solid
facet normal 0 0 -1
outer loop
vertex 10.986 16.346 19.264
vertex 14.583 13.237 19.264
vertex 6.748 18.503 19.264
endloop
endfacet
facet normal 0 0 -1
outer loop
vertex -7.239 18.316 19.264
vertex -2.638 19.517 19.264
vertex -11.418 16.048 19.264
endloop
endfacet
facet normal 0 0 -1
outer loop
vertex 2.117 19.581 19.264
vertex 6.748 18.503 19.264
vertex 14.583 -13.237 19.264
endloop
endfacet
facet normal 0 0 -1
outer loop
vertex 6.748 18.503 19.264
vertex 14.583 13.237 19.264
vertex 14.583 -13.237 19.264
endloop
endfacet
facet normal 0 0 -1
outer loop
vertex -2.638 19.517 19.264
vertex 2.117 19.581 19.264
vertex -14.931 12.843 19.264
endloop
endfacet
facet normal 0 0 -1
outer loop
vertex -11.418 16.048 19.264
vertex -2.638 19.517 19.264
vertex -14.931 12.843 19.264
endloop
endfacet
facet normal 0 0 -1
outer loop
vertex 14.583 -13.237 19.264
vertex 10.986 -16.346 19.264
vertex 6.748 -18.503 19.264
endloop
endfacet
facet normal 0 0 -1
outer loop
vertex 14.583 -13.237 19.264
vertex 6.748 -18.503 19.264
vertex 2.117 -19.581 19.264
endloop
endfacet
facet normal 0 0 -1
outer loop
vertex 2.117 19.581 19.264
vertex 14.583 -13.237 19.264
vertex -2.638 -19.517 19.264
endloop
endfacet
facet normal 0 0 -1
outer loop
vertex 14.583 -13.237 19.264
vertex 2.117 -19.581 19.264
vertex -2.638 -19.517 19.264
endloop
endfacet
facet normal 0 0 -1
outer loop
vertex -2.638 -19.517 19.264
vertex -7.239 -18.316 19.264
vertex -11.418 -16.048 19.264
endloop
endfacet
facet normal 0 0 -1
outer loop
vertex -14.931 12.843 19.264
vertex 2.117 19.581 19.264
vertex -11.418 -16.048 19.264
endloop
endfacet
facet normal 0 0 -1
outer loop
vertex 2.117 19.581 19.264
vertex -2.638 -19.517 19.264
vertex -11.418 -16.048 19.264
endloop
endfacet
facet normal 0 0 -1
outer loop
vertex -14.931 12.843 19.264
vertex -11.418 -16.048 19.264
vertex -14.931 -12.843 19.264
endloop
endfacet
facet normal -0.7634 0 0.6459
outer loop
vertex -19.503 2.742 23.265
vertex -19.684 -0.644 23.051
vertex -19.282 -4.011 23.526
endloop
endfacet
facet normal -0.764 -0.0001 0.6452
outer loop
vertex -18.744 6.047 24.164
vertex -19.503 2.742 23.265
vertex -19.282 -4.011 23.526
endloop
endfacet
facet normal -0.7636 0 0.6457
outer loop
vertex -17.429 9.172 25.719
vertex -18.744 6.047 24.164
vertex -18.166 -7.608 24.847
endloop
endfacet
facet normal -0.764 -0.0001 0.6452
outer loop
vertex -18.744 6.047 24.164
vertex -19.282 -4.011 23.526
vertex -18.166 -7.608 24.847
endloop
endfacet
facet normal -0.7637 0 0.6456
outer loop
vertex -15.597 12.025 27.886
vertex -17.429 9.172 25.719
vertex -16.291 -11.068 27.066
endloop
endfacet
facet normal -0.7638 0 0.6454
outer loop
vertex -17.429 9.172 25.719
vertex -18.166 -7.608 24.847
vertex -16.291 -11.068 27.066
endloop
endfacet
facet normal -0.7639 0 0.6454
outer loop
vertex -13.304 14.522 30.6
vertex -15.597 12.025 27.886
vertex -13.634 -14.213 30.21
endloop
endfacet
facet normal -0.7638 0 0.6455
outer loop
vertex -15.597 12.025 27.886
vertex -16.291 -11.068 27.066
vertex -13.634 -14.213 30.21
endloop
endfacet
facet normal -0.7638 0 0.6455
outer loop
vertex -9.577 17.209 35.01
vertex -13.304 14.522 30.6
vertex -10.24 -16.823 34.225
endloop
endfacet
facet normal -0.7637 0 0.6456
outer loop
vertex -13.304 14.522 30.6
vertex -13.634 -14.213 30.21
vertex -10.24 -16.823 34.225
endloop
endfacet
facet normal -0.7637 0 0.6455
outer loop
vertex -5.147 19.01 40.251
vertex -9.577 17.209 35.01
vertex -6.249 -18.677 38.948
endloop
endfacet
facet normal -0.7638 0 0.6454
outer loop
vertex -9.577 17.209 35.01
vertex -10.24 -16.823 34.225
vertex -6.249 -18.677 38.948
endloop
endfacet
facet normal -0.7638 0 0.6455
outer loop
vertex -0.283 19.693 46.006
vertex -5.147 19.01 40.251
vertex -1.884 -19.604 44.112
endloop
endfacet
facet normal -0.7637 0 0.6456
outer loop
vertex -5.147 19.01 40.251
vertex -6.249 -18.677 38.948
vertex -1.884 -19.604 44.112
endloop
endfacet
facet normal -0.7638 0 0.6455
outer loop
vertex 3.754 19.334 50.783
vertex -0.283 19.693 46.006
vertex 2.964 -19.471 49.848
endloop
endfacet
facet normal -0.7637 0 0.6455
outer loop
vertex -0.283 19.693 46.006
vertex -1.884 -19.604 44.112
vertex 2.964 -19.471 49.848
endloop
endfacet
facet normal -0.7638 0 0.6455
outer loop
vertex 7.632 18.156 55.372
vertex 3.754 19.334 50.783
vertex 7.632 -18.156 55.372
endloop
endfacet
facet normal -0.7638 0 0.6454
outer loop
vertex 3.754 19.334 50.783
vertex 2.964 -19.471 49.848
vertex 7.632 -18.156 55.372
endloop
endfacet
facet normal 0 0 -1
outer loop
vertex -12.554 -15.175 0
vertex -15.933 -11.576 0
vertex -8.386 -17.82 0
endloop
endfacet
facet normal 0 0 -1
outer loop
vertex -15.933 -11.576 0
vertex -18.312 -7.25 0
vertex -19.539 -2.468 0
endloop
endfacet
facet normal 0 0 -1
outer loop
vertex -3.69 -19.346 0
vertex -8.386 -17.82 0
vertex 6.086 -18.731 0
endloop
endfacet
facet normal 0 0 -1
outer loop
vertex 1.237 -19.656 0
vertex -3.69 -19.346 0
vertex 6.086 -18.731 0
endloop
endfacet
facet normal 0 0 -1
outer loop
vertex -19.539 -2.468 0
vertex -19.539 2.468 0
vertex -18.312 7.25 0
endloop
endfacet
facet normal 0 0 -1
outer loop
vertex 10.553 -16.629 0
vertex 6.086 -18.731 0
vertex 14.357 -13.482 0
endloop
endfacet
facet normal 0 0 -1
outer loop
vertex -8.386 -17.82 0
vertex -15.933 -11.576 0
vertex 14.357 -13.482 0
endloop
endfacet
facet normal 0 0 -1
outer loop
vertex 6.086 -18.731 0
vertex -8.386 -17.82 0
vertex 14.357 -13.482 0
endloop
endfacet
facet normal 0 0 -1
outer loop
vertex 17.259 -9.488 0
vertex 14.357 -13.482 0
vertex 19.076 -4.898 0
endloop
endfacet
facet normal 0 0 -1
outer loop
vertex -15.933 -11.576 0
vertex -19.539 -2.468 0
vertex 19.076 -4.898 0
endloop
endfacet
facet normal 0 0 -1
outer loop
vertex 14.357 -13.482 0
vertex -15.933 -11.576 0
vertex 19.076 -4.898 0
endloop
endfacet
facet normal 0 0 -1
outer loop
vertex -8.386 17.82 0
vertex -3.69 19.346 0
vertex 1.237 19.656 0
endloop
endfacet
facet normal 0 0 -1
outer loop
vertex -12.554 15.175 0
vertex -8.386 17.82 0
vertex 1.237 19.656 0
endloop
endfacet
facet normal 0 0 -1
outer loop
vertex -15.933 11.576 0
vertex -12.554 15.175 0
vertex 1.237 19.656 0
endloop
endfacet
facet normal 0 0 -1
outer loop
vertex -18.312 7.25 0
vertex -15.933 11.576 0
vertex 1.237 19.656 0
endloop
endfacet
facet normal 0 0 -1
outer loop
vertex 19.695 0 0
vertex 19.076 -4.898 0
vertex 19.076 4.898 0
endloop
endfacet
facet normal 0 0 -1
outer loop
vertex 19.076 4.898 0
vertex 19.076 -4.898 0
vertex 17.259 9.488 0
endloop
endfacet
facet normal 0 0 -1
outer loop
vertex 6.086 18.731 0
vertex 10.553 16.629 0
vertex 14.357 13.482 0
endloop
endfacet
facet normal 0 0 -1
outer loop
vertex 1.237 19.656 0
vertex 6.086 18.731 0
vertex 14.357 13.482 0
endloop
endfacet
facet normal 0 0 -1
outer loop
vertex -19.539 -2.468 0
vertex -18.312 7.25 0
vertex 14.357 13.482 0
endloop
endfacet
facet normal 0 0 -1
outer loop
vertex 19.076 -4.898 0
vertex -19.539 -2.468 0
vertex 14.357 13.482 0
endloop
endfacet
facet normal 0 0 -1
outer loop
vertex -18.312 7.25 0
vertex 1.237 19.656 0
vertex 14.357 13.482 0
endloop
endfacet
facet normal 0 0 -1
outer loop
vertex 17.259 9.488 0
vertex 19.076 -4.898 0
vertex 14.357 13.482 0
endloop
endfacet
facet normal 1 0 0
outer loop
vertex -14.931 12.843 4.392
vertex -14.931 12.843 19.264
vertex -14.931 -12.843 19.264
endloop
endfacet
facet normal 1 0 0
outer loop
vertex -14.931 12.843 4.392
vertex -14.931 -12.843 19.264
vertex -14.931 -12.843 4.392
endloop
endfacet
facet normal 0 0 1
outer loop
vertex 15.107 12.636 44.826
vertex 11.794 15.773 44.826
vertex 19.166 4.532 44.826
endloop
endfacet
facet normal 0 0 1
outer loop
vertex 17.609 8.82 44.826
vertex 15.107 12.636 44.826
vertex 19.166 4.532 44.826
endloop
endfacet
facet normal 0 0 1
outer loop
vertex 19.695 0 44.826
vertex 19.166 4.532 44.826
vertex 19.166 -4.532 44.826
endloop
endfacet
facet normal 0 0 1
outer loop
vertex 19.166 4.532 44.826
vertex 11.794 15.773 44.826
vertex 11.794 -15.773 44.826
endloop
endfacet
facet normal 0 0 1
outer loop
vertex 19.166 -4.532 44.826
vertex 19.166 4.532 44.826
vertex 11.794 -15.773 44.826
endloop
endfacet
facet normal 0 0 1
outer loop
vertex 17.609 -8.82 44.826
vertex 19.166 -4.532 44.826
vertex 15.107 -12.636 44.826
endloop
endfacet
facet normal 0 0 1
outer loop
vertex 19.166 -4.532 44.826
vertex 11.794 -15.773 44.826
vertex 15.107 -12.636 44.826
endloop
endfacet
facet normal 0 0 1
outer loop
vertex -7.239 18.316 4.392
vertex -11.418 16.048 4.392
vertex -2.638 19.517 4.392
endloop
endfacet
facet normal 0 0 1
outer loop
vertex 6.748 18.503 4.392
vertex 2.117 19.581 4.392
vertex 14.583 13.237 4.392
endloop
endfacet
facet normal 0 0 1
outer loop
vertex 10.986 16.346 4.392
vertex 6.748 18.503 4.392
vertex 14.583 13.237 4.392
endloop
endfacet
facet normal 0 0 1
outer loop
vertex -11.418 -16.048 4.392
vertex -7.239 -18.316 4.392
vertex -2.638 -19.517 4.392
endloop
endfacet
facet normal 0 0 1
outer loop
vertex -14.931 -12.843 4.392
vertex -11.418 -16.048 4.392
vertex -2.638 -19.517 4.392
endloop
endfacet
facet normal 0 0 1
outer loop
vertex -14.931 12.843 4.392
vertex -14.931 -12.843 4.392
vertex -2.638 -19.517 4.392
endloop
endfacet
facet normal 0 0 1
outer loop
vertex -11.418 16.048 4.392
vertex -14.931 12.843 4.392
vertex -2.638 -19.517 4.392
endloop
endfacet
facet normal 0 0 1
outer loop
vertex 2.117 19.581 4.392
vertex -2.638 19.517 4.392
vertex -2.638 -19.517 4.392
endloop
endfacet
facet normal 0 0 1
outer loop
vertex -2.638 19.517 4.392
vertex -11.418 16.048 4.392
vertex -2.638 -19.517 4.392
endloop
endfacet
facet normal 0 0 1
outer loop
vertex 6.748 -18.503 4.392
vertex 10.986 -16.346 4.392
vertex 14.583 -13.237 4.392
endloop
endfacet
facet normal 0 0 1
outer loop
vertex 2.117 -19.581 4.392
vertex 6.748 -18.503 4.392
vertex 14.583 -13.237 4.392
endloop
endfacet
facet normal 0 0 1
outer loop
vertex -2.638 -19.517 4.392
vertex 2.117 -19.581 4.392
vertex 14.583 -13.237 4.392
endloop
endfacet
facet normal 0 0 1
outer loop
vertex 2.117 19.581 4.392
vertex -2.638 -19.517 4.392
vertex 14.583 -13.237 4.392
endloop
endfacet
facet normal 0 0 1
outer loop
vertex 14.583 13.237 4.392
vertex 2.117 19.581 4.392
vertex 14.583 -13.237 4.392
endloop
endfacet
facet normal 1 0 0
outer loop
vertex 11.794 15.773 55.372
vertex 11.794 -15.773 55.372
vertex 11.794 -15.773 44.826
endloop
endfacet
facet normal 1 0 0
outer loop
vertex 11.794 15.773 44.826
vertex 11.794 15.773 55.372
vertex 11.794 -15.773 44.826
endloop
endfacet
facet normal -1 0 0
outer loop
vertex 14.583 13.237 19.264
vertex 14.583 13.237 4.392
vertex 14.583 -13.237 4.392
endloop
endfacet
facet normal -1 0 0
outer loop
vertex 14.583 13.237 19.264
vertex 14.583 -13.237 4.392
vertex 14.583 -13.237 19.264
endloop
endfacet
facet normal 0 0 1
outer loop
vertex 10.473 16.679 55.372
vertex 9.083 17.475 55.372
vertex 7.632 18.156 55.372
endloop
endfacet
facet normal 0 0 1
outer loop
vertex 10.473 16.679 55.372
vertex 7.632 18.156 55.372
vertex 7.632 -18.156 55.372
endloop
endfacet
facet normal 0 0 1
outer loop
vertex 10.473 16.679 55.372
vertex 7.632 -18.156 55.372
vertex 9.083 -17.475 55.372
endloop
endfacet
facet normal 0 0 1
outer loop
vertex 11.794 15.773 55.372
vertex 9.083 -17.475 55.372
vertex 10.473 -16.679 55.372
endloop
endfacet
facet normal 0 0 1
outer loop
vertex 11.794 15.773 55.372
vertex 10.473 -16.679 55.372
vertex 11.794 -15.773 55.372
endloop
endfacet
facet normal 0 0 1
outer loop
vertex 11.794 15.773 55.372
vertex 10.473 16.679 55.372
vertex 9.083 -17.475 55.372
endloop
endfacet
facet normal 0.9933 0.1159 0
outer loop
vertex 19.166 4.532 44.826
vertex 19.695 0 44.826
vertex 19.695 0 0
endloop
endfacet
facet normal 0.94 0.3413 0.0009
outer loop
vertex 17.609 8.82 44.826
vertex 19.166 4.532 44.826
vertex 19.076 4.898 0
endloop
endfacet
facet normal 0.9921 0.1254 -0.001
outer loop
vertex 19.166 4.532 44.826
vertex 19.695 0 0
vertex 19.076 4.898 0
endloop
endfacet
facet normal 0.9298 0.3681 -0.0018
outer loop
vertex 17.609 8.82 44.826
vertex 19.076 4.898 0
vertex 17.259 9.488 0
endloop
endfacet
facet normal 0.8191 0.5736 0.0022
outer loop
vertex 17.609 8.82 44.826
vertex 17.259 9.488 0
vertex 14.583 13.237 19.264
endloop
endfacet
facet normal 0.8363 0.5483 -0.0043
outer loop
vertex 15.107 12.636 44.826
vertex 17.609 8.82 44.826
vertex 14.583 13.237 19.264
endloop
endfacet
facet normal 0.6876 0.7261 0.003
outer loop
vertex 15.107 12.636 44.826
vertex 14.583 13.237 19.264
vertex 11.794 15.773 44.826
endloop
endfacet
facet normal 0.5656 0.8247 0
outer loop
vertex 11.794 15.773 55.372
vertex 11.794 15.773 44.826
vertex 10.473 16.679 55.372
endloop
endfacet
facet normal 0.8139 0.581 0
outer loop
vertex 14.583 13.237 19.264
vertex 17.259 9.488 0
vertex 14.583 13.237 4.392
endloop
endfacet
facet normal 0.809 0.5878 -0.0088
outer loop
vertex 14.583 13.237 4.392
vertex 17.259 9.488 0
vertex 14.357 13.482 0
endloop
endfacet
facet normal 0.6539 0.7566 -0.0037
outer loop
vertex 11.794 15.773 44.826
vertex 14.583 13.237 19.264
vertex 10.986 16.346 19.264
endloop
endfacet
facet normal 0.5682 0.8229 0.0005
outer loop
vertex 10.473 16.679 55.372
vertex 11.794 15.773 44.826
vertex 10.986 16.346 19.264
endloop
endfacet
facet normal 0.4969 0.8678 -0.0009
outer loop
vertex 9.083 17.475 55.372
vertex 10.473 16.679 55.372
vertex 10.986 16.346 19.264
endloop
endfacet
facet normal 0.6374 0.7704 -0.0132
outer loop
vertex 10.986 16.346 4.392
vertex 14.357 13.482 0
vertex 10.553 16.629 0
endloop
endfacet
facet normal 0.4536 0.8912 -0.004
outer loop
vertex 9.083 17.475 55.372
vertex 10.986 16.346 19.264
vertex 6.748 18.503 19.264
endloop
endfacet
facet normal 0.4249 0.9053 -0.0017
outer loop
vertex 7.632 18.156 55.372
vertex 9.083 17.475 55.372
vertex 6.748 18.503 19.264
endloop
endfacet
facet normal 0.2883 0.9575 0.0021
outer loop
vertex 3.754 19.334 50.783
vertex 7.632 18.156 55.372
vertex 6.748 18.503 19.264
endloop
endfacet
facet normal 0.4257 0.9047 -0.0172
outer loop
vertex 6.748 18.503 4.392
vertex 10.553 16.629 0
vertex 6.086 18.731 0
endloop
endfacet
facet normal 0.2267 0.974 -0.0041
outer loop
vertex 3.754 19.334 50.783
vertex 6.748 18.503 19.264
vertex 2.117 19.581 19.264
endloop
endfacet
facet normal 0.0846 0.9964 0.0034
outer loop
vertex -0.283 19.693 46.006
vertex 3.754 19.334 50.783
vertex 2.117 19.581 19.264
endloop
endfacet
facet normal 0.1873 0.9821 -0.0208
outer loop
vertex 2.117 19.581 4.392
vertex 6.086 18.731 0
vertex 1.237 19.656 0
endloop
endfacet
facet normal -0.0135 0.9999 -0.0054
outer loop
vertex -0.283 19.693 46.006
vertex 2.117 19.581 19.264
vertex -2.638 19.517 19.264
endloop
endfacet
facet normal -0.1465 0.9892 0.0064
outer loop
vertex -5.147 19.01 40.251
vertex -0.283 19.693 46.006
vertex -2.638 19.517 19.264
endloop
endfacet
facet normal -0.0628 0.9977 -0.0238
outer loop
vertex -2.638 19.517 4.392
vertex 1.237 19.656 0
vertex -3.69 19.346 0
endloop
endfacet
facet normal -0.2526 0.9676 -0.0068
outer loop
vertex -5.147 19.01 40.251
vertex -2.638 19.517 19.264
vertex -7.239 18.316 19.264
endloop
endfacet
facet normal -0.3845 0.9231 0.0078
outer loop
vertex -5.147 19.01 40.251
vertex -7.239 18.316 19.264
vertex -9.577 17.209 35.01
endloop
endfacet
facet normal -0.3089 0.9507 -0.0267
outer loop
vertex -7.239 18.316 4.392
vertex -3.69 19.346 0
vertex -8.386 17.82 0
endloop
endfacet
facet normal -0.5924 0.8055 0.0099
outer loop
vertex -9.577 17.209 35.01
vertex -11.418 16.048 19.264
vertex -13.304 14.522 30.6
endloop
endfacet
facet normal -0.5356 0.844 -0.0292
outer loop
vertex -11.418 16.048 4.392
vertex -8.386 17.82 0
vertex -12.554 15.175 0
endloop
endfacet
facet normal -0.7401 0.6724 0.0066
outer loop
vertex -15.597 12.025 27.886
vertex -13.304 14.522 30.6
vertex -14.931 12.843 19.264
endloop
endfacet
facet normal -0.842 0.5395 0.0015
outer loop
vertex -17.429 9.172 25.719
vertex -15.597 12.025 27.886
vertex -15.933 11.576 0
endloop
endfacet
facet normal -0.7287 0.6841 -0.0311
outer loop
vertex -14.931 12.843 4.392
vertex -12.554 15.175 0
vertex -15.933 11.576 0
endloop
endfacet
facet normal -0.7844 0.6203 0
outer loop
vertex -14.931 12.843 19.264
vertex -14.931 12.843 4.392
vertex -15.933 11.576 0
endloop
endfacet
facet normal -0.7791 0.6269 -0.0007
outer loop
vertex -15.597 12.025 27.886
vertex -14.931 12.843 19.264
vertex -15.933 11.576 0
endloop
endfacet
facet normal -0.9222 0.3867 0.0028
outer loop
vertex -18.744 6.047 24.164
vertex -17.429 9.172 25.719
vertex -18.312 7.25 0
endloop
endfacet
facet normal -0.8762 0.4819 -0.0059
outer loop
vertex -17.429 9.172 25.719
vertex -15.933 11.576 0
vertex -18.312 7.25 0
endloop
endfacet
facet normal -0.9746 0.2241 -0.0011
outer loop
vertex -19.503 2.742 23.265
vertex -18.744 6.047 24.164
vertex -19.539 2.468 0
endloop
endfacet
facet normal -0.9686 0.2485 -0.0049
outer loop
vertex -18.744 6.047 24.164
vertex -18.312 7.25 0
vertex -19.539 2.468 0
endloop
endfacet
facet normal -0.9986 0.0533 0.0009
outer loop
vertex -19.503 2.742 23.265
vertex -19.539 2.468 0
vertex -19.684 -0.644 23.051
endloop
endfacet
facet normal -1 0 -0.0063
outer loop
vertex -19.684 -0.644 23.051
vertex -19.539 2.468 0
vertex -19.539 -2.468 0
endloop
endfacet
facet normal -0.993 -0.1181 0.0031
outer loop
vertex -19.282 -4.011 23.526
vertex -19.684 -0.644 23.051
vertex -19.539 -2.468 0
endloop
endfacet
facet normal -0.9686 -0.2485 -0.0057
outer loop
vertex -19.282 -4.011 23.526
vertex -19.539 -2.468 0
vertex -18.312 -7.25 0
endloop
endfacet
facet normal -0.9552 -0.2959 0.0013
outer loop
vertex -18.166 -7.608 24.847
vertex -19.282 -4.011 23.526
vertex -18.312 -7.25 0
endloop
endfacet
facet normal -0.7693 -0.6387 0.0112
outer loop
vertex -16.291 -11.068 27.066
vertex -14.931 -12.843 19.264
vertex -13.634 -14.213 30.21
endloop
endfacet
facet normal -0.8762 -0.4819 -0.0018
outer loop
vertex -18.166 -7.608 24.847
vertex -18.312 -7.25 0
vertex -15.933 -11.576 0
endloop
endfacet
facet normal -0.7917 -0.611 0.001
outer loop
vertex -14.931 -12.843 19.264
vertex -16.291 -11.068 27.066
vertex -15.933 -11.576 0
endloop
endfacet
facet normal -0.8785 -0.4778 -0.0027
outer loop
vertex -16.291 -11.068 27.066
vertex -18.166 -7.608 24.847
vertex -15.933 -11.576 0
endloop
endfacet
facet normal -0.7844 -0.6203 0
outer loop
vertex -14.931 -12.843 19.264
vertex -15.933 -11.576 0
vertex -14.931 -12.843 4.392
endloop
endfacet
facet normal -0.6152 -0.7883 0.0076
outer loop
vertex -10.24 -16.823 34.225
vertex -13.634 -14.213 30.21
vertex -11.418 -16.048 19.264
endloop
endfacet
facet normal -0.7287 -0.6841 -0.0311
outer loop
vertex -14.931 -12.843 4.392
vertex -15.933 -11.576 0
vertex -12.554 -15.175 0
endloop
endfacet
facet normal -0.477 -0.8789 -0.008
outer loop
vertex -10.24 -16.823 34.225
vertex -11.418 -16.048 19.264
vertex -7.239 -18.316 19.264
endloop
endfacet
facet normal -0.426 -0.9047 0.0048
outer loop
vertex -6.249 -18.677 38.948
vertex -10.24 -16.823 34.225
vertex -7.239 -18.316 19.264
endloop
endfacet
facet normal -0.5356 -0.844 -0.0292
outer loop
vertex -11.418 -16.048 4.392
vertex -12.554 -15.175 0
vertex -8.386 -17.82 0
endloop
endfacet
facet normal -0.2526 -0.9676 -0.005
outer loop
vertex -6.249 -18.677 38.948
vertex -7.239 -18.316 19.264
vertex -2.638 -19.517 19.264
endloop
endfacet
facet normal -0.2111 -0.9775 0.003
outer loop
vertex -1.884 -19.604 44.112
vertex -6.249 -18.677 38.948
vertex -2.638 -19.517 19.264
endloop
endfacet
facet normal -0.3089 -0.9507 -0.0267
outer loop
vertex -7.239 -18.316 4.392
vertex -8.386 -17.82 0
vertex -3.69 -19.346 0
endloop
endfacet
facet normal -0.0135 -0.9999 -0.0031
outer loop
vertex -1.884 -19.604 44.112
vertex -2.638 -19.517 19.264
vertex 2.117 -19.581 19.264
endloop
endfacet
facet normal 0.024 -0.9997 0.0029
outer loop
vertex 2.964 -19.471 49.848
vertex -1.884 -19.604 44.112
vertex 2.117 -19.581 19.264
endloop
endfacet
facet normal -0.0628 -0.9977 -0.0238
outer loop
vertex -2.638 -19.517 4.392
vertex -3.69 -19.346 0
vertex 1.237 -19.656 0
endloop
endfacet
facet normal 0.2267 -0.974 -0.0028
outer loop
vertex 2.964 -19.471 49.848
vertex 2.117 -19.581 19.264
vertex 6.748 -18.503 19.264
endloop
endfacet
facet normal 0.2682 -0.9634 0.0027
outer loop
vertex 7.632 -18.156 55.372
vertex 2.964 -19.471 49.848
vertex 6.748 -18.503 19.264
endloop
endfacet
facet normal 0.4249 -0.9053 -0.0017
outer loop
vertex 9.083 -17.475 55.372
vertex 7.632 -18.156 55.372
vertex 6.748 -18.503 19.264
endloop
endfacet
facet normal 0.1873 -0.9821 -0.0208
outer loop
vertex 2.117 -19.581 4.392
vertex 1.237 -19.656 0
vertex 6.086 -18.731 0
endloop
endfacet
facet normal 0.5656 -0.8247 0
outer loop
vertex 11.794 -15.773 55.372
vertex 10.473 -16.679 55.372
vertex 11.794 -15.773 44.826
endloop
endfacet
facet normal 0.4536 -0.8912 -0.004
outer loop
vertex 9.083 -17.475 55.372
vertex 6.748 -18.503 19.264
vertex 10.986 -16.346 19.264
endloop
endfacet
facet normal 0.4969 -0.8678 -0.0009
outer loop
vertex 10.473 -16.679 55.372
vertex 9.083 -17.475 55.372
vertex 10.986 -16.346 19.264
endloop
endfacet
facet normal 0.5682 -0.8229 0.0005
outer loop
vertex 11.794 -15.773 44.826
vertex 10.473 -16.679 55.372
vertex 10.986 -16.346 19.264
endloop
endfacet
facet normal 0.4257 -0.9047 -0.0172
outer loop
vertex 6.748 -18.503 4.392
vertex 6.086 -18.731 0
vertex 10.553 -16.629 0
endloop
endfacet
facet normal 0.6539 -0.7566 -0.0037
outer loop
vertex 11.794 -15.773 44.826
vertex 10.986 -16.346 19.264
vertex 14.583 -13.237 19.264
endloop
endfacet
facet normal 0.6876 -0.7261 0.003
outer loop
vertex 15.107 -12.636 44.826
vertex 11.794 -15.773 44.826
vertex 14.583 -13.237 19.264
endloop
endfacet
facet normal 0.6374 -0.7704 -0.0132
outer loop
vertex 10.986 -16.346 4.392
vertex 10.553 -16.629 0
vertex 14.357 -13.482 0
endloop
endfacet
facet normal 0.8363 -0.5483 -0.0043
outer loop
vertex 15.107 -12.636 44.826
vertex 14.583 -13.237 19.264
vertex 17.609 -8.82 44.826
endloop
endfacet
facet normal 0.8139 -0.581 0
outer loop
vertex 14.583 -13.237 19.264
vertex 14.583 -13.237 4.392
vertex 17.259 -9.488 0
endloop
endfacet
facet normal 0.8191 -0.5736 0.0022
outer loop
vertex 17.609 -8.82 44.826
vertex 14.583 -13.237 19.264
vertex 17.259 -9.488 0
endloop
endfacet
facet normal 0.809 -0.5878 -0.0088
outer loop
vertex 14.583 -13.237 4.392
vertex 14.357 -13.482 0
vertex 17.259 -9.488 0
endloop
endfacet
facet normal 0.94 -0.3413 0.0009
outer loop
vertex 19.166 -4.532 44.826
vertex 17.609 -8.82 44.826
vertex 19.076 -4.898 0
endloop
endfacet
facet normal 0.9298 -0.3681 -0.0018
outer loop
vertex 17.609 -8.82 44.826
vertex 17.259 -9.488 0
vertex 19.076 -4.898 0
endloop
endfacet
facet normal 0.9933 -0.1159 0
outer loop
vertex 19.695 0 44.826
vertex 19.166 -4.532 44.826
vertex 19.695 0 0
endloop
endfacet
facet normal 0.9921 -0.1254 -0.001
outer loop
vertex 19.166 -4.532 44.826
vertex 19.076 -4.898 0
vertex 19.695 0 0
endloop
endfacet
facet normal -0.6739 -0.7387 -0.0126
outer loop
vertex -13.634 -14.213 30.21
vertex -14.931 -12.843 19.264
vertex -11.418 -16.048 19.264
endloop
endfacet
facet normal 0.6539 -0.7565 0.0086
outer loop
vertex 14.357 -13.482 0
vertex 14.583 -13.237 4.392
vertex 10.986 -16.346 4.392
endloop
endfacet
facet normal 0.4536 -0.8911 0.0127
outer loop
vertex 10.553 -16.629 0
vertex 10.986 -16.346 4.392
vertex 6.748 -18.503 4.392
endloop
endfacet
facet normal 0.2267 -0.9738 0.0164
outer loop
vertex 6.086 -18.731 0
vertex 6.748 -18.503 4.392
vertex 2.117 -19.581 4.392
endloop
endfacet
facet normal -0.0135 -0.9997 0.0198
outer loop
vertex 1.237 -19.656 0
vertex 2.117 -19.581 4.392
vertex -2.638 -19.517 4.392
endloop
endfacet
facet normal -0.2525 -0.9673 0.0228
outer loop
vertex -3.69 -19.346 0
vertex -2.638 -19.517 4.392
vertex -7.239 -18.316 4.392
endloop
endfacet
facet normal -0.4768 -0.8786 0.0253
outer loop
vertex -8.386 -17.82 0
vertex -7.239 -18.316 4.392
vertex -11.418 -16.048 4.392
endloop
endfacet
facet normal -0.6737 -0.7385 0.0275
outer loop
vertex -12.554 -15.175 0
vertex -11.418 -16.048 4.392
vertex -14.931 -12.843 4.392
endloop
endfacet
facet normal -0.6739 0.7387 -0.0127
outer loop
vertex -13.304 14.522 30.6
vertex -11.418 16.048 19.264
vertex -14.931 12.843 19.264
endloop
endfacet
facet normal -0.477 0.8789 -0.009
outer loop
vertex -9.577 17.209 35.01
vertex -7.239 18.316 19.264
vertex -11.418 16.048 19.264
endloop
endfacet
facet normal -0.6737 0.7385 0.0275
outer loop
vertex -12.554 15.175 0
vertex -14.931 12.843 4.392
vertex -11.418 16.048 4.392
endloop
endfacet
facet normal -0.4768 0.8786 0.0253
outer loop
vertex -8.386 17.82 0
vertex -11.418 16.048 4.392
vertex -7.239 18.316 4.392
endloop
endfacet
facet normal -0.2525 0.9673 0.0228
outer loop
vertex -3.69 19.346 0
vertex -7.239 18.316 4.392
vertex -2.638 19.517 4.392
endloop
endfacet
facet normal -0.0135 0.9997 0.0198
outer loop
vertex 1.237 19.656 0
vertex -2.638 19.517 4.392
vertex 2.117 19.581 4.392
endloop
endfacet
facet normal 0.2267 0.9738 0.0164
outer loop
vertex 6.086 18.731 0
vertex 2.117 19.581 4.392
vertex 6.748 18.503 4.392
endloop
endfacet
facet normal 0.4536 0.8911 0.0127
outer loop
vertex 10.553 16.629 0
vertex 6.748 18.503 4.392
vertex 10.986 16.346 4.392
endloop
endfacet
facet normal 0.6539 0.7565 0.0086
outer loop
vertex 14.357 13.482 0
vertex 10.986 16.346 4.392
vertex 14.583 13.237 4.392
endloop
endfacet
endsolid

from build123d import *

# Parameters (mm, degrees)
F0_R     = 19.694794
F1_DEPTH = 55.372
F4_DEPTH = 114.046
F6_DEPTH = 254


with BuildPart() as f1:
    # F0 (on Top) → F1 (new body)
    with BuildSketch(Plane.XY):
        Circle(F0_R)
    extrude(amount=F1_DEPTH)

    # F3 (on offset) → F4 (cut)
    with BuildSketch(Plane.XZ.offset(62.738)):
        Polygon((23.87774, 61.791748), (11.794434, 56.214053), (11.794434, 44.826049), (23.87774, 44.826049), align=None)
    extrude(amount=-F4_DEPTH, mode=Mode.SUBTRACT)

    # F5 (on offset) → F6 (cut)
    with BuildSketch(Plane.XZ.offset(62.738)):
        Polygon((-14.930949, 19.263754), (-14.930949, 14.383911), (-14.930949, 4.391609), (14.583289, 4.391609), (14.583289, 19.263754), align=None)
        Polygon((8.540357, 56.446675), (0, 56.446675), (-21.901777, 57.607204), (-21.901777, 20.426836), align=None)
    extrude(amount=-F6_DEPTH, mode=Mode.SUBTRACT)


solid = f1.part
